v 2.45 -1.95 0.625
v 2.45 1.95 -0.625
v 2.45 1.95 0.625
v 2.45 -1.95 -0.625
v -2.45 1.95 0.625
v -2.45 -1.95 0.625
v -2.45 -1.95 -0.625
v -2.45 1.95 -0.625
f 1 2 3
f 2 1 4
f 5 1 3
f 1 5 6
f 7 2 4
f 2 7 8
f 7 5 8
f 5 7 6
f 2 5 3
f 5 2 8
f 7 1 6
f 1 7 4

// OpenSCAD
// Parameters
body_length = 4.9; //[2.45:9.8:0.05]
body_width = 3.9; //[1.95:7.8:0.05]
body_height = 1.25; //[0.6:2.5:0.05]
eps = 0.8; //[0.5:2.0:0.1]

// SMD Package Module
module smd_package() {
  color([0.85, 0.85, 0.8]) // Off-white color for SMD body
  union() {
    // Main SMD Body
    translate([0, 0, 0])
      cube([body_length, body_width, body_height], center=true);

    // Polarity Mark (Placeholder)
    translate([0, 0, 0])
      cube([eps, eps, eps], center=true);

    // Top Marking (Placeholder)
    translate([0, 0, 0])
      cube([eps, eps, eps], center=true);

    // Edge Chamfer (Placeholder)
    translate([0, 0, 0])
      cube([eps, eps, eps], center=true);

    // Pads/Leads (Placeholder)
    translate([0, 0, 0])
      cube([eps, eps, eps], center=true);
  }
}

// Render the SMD Package
smd_package();
